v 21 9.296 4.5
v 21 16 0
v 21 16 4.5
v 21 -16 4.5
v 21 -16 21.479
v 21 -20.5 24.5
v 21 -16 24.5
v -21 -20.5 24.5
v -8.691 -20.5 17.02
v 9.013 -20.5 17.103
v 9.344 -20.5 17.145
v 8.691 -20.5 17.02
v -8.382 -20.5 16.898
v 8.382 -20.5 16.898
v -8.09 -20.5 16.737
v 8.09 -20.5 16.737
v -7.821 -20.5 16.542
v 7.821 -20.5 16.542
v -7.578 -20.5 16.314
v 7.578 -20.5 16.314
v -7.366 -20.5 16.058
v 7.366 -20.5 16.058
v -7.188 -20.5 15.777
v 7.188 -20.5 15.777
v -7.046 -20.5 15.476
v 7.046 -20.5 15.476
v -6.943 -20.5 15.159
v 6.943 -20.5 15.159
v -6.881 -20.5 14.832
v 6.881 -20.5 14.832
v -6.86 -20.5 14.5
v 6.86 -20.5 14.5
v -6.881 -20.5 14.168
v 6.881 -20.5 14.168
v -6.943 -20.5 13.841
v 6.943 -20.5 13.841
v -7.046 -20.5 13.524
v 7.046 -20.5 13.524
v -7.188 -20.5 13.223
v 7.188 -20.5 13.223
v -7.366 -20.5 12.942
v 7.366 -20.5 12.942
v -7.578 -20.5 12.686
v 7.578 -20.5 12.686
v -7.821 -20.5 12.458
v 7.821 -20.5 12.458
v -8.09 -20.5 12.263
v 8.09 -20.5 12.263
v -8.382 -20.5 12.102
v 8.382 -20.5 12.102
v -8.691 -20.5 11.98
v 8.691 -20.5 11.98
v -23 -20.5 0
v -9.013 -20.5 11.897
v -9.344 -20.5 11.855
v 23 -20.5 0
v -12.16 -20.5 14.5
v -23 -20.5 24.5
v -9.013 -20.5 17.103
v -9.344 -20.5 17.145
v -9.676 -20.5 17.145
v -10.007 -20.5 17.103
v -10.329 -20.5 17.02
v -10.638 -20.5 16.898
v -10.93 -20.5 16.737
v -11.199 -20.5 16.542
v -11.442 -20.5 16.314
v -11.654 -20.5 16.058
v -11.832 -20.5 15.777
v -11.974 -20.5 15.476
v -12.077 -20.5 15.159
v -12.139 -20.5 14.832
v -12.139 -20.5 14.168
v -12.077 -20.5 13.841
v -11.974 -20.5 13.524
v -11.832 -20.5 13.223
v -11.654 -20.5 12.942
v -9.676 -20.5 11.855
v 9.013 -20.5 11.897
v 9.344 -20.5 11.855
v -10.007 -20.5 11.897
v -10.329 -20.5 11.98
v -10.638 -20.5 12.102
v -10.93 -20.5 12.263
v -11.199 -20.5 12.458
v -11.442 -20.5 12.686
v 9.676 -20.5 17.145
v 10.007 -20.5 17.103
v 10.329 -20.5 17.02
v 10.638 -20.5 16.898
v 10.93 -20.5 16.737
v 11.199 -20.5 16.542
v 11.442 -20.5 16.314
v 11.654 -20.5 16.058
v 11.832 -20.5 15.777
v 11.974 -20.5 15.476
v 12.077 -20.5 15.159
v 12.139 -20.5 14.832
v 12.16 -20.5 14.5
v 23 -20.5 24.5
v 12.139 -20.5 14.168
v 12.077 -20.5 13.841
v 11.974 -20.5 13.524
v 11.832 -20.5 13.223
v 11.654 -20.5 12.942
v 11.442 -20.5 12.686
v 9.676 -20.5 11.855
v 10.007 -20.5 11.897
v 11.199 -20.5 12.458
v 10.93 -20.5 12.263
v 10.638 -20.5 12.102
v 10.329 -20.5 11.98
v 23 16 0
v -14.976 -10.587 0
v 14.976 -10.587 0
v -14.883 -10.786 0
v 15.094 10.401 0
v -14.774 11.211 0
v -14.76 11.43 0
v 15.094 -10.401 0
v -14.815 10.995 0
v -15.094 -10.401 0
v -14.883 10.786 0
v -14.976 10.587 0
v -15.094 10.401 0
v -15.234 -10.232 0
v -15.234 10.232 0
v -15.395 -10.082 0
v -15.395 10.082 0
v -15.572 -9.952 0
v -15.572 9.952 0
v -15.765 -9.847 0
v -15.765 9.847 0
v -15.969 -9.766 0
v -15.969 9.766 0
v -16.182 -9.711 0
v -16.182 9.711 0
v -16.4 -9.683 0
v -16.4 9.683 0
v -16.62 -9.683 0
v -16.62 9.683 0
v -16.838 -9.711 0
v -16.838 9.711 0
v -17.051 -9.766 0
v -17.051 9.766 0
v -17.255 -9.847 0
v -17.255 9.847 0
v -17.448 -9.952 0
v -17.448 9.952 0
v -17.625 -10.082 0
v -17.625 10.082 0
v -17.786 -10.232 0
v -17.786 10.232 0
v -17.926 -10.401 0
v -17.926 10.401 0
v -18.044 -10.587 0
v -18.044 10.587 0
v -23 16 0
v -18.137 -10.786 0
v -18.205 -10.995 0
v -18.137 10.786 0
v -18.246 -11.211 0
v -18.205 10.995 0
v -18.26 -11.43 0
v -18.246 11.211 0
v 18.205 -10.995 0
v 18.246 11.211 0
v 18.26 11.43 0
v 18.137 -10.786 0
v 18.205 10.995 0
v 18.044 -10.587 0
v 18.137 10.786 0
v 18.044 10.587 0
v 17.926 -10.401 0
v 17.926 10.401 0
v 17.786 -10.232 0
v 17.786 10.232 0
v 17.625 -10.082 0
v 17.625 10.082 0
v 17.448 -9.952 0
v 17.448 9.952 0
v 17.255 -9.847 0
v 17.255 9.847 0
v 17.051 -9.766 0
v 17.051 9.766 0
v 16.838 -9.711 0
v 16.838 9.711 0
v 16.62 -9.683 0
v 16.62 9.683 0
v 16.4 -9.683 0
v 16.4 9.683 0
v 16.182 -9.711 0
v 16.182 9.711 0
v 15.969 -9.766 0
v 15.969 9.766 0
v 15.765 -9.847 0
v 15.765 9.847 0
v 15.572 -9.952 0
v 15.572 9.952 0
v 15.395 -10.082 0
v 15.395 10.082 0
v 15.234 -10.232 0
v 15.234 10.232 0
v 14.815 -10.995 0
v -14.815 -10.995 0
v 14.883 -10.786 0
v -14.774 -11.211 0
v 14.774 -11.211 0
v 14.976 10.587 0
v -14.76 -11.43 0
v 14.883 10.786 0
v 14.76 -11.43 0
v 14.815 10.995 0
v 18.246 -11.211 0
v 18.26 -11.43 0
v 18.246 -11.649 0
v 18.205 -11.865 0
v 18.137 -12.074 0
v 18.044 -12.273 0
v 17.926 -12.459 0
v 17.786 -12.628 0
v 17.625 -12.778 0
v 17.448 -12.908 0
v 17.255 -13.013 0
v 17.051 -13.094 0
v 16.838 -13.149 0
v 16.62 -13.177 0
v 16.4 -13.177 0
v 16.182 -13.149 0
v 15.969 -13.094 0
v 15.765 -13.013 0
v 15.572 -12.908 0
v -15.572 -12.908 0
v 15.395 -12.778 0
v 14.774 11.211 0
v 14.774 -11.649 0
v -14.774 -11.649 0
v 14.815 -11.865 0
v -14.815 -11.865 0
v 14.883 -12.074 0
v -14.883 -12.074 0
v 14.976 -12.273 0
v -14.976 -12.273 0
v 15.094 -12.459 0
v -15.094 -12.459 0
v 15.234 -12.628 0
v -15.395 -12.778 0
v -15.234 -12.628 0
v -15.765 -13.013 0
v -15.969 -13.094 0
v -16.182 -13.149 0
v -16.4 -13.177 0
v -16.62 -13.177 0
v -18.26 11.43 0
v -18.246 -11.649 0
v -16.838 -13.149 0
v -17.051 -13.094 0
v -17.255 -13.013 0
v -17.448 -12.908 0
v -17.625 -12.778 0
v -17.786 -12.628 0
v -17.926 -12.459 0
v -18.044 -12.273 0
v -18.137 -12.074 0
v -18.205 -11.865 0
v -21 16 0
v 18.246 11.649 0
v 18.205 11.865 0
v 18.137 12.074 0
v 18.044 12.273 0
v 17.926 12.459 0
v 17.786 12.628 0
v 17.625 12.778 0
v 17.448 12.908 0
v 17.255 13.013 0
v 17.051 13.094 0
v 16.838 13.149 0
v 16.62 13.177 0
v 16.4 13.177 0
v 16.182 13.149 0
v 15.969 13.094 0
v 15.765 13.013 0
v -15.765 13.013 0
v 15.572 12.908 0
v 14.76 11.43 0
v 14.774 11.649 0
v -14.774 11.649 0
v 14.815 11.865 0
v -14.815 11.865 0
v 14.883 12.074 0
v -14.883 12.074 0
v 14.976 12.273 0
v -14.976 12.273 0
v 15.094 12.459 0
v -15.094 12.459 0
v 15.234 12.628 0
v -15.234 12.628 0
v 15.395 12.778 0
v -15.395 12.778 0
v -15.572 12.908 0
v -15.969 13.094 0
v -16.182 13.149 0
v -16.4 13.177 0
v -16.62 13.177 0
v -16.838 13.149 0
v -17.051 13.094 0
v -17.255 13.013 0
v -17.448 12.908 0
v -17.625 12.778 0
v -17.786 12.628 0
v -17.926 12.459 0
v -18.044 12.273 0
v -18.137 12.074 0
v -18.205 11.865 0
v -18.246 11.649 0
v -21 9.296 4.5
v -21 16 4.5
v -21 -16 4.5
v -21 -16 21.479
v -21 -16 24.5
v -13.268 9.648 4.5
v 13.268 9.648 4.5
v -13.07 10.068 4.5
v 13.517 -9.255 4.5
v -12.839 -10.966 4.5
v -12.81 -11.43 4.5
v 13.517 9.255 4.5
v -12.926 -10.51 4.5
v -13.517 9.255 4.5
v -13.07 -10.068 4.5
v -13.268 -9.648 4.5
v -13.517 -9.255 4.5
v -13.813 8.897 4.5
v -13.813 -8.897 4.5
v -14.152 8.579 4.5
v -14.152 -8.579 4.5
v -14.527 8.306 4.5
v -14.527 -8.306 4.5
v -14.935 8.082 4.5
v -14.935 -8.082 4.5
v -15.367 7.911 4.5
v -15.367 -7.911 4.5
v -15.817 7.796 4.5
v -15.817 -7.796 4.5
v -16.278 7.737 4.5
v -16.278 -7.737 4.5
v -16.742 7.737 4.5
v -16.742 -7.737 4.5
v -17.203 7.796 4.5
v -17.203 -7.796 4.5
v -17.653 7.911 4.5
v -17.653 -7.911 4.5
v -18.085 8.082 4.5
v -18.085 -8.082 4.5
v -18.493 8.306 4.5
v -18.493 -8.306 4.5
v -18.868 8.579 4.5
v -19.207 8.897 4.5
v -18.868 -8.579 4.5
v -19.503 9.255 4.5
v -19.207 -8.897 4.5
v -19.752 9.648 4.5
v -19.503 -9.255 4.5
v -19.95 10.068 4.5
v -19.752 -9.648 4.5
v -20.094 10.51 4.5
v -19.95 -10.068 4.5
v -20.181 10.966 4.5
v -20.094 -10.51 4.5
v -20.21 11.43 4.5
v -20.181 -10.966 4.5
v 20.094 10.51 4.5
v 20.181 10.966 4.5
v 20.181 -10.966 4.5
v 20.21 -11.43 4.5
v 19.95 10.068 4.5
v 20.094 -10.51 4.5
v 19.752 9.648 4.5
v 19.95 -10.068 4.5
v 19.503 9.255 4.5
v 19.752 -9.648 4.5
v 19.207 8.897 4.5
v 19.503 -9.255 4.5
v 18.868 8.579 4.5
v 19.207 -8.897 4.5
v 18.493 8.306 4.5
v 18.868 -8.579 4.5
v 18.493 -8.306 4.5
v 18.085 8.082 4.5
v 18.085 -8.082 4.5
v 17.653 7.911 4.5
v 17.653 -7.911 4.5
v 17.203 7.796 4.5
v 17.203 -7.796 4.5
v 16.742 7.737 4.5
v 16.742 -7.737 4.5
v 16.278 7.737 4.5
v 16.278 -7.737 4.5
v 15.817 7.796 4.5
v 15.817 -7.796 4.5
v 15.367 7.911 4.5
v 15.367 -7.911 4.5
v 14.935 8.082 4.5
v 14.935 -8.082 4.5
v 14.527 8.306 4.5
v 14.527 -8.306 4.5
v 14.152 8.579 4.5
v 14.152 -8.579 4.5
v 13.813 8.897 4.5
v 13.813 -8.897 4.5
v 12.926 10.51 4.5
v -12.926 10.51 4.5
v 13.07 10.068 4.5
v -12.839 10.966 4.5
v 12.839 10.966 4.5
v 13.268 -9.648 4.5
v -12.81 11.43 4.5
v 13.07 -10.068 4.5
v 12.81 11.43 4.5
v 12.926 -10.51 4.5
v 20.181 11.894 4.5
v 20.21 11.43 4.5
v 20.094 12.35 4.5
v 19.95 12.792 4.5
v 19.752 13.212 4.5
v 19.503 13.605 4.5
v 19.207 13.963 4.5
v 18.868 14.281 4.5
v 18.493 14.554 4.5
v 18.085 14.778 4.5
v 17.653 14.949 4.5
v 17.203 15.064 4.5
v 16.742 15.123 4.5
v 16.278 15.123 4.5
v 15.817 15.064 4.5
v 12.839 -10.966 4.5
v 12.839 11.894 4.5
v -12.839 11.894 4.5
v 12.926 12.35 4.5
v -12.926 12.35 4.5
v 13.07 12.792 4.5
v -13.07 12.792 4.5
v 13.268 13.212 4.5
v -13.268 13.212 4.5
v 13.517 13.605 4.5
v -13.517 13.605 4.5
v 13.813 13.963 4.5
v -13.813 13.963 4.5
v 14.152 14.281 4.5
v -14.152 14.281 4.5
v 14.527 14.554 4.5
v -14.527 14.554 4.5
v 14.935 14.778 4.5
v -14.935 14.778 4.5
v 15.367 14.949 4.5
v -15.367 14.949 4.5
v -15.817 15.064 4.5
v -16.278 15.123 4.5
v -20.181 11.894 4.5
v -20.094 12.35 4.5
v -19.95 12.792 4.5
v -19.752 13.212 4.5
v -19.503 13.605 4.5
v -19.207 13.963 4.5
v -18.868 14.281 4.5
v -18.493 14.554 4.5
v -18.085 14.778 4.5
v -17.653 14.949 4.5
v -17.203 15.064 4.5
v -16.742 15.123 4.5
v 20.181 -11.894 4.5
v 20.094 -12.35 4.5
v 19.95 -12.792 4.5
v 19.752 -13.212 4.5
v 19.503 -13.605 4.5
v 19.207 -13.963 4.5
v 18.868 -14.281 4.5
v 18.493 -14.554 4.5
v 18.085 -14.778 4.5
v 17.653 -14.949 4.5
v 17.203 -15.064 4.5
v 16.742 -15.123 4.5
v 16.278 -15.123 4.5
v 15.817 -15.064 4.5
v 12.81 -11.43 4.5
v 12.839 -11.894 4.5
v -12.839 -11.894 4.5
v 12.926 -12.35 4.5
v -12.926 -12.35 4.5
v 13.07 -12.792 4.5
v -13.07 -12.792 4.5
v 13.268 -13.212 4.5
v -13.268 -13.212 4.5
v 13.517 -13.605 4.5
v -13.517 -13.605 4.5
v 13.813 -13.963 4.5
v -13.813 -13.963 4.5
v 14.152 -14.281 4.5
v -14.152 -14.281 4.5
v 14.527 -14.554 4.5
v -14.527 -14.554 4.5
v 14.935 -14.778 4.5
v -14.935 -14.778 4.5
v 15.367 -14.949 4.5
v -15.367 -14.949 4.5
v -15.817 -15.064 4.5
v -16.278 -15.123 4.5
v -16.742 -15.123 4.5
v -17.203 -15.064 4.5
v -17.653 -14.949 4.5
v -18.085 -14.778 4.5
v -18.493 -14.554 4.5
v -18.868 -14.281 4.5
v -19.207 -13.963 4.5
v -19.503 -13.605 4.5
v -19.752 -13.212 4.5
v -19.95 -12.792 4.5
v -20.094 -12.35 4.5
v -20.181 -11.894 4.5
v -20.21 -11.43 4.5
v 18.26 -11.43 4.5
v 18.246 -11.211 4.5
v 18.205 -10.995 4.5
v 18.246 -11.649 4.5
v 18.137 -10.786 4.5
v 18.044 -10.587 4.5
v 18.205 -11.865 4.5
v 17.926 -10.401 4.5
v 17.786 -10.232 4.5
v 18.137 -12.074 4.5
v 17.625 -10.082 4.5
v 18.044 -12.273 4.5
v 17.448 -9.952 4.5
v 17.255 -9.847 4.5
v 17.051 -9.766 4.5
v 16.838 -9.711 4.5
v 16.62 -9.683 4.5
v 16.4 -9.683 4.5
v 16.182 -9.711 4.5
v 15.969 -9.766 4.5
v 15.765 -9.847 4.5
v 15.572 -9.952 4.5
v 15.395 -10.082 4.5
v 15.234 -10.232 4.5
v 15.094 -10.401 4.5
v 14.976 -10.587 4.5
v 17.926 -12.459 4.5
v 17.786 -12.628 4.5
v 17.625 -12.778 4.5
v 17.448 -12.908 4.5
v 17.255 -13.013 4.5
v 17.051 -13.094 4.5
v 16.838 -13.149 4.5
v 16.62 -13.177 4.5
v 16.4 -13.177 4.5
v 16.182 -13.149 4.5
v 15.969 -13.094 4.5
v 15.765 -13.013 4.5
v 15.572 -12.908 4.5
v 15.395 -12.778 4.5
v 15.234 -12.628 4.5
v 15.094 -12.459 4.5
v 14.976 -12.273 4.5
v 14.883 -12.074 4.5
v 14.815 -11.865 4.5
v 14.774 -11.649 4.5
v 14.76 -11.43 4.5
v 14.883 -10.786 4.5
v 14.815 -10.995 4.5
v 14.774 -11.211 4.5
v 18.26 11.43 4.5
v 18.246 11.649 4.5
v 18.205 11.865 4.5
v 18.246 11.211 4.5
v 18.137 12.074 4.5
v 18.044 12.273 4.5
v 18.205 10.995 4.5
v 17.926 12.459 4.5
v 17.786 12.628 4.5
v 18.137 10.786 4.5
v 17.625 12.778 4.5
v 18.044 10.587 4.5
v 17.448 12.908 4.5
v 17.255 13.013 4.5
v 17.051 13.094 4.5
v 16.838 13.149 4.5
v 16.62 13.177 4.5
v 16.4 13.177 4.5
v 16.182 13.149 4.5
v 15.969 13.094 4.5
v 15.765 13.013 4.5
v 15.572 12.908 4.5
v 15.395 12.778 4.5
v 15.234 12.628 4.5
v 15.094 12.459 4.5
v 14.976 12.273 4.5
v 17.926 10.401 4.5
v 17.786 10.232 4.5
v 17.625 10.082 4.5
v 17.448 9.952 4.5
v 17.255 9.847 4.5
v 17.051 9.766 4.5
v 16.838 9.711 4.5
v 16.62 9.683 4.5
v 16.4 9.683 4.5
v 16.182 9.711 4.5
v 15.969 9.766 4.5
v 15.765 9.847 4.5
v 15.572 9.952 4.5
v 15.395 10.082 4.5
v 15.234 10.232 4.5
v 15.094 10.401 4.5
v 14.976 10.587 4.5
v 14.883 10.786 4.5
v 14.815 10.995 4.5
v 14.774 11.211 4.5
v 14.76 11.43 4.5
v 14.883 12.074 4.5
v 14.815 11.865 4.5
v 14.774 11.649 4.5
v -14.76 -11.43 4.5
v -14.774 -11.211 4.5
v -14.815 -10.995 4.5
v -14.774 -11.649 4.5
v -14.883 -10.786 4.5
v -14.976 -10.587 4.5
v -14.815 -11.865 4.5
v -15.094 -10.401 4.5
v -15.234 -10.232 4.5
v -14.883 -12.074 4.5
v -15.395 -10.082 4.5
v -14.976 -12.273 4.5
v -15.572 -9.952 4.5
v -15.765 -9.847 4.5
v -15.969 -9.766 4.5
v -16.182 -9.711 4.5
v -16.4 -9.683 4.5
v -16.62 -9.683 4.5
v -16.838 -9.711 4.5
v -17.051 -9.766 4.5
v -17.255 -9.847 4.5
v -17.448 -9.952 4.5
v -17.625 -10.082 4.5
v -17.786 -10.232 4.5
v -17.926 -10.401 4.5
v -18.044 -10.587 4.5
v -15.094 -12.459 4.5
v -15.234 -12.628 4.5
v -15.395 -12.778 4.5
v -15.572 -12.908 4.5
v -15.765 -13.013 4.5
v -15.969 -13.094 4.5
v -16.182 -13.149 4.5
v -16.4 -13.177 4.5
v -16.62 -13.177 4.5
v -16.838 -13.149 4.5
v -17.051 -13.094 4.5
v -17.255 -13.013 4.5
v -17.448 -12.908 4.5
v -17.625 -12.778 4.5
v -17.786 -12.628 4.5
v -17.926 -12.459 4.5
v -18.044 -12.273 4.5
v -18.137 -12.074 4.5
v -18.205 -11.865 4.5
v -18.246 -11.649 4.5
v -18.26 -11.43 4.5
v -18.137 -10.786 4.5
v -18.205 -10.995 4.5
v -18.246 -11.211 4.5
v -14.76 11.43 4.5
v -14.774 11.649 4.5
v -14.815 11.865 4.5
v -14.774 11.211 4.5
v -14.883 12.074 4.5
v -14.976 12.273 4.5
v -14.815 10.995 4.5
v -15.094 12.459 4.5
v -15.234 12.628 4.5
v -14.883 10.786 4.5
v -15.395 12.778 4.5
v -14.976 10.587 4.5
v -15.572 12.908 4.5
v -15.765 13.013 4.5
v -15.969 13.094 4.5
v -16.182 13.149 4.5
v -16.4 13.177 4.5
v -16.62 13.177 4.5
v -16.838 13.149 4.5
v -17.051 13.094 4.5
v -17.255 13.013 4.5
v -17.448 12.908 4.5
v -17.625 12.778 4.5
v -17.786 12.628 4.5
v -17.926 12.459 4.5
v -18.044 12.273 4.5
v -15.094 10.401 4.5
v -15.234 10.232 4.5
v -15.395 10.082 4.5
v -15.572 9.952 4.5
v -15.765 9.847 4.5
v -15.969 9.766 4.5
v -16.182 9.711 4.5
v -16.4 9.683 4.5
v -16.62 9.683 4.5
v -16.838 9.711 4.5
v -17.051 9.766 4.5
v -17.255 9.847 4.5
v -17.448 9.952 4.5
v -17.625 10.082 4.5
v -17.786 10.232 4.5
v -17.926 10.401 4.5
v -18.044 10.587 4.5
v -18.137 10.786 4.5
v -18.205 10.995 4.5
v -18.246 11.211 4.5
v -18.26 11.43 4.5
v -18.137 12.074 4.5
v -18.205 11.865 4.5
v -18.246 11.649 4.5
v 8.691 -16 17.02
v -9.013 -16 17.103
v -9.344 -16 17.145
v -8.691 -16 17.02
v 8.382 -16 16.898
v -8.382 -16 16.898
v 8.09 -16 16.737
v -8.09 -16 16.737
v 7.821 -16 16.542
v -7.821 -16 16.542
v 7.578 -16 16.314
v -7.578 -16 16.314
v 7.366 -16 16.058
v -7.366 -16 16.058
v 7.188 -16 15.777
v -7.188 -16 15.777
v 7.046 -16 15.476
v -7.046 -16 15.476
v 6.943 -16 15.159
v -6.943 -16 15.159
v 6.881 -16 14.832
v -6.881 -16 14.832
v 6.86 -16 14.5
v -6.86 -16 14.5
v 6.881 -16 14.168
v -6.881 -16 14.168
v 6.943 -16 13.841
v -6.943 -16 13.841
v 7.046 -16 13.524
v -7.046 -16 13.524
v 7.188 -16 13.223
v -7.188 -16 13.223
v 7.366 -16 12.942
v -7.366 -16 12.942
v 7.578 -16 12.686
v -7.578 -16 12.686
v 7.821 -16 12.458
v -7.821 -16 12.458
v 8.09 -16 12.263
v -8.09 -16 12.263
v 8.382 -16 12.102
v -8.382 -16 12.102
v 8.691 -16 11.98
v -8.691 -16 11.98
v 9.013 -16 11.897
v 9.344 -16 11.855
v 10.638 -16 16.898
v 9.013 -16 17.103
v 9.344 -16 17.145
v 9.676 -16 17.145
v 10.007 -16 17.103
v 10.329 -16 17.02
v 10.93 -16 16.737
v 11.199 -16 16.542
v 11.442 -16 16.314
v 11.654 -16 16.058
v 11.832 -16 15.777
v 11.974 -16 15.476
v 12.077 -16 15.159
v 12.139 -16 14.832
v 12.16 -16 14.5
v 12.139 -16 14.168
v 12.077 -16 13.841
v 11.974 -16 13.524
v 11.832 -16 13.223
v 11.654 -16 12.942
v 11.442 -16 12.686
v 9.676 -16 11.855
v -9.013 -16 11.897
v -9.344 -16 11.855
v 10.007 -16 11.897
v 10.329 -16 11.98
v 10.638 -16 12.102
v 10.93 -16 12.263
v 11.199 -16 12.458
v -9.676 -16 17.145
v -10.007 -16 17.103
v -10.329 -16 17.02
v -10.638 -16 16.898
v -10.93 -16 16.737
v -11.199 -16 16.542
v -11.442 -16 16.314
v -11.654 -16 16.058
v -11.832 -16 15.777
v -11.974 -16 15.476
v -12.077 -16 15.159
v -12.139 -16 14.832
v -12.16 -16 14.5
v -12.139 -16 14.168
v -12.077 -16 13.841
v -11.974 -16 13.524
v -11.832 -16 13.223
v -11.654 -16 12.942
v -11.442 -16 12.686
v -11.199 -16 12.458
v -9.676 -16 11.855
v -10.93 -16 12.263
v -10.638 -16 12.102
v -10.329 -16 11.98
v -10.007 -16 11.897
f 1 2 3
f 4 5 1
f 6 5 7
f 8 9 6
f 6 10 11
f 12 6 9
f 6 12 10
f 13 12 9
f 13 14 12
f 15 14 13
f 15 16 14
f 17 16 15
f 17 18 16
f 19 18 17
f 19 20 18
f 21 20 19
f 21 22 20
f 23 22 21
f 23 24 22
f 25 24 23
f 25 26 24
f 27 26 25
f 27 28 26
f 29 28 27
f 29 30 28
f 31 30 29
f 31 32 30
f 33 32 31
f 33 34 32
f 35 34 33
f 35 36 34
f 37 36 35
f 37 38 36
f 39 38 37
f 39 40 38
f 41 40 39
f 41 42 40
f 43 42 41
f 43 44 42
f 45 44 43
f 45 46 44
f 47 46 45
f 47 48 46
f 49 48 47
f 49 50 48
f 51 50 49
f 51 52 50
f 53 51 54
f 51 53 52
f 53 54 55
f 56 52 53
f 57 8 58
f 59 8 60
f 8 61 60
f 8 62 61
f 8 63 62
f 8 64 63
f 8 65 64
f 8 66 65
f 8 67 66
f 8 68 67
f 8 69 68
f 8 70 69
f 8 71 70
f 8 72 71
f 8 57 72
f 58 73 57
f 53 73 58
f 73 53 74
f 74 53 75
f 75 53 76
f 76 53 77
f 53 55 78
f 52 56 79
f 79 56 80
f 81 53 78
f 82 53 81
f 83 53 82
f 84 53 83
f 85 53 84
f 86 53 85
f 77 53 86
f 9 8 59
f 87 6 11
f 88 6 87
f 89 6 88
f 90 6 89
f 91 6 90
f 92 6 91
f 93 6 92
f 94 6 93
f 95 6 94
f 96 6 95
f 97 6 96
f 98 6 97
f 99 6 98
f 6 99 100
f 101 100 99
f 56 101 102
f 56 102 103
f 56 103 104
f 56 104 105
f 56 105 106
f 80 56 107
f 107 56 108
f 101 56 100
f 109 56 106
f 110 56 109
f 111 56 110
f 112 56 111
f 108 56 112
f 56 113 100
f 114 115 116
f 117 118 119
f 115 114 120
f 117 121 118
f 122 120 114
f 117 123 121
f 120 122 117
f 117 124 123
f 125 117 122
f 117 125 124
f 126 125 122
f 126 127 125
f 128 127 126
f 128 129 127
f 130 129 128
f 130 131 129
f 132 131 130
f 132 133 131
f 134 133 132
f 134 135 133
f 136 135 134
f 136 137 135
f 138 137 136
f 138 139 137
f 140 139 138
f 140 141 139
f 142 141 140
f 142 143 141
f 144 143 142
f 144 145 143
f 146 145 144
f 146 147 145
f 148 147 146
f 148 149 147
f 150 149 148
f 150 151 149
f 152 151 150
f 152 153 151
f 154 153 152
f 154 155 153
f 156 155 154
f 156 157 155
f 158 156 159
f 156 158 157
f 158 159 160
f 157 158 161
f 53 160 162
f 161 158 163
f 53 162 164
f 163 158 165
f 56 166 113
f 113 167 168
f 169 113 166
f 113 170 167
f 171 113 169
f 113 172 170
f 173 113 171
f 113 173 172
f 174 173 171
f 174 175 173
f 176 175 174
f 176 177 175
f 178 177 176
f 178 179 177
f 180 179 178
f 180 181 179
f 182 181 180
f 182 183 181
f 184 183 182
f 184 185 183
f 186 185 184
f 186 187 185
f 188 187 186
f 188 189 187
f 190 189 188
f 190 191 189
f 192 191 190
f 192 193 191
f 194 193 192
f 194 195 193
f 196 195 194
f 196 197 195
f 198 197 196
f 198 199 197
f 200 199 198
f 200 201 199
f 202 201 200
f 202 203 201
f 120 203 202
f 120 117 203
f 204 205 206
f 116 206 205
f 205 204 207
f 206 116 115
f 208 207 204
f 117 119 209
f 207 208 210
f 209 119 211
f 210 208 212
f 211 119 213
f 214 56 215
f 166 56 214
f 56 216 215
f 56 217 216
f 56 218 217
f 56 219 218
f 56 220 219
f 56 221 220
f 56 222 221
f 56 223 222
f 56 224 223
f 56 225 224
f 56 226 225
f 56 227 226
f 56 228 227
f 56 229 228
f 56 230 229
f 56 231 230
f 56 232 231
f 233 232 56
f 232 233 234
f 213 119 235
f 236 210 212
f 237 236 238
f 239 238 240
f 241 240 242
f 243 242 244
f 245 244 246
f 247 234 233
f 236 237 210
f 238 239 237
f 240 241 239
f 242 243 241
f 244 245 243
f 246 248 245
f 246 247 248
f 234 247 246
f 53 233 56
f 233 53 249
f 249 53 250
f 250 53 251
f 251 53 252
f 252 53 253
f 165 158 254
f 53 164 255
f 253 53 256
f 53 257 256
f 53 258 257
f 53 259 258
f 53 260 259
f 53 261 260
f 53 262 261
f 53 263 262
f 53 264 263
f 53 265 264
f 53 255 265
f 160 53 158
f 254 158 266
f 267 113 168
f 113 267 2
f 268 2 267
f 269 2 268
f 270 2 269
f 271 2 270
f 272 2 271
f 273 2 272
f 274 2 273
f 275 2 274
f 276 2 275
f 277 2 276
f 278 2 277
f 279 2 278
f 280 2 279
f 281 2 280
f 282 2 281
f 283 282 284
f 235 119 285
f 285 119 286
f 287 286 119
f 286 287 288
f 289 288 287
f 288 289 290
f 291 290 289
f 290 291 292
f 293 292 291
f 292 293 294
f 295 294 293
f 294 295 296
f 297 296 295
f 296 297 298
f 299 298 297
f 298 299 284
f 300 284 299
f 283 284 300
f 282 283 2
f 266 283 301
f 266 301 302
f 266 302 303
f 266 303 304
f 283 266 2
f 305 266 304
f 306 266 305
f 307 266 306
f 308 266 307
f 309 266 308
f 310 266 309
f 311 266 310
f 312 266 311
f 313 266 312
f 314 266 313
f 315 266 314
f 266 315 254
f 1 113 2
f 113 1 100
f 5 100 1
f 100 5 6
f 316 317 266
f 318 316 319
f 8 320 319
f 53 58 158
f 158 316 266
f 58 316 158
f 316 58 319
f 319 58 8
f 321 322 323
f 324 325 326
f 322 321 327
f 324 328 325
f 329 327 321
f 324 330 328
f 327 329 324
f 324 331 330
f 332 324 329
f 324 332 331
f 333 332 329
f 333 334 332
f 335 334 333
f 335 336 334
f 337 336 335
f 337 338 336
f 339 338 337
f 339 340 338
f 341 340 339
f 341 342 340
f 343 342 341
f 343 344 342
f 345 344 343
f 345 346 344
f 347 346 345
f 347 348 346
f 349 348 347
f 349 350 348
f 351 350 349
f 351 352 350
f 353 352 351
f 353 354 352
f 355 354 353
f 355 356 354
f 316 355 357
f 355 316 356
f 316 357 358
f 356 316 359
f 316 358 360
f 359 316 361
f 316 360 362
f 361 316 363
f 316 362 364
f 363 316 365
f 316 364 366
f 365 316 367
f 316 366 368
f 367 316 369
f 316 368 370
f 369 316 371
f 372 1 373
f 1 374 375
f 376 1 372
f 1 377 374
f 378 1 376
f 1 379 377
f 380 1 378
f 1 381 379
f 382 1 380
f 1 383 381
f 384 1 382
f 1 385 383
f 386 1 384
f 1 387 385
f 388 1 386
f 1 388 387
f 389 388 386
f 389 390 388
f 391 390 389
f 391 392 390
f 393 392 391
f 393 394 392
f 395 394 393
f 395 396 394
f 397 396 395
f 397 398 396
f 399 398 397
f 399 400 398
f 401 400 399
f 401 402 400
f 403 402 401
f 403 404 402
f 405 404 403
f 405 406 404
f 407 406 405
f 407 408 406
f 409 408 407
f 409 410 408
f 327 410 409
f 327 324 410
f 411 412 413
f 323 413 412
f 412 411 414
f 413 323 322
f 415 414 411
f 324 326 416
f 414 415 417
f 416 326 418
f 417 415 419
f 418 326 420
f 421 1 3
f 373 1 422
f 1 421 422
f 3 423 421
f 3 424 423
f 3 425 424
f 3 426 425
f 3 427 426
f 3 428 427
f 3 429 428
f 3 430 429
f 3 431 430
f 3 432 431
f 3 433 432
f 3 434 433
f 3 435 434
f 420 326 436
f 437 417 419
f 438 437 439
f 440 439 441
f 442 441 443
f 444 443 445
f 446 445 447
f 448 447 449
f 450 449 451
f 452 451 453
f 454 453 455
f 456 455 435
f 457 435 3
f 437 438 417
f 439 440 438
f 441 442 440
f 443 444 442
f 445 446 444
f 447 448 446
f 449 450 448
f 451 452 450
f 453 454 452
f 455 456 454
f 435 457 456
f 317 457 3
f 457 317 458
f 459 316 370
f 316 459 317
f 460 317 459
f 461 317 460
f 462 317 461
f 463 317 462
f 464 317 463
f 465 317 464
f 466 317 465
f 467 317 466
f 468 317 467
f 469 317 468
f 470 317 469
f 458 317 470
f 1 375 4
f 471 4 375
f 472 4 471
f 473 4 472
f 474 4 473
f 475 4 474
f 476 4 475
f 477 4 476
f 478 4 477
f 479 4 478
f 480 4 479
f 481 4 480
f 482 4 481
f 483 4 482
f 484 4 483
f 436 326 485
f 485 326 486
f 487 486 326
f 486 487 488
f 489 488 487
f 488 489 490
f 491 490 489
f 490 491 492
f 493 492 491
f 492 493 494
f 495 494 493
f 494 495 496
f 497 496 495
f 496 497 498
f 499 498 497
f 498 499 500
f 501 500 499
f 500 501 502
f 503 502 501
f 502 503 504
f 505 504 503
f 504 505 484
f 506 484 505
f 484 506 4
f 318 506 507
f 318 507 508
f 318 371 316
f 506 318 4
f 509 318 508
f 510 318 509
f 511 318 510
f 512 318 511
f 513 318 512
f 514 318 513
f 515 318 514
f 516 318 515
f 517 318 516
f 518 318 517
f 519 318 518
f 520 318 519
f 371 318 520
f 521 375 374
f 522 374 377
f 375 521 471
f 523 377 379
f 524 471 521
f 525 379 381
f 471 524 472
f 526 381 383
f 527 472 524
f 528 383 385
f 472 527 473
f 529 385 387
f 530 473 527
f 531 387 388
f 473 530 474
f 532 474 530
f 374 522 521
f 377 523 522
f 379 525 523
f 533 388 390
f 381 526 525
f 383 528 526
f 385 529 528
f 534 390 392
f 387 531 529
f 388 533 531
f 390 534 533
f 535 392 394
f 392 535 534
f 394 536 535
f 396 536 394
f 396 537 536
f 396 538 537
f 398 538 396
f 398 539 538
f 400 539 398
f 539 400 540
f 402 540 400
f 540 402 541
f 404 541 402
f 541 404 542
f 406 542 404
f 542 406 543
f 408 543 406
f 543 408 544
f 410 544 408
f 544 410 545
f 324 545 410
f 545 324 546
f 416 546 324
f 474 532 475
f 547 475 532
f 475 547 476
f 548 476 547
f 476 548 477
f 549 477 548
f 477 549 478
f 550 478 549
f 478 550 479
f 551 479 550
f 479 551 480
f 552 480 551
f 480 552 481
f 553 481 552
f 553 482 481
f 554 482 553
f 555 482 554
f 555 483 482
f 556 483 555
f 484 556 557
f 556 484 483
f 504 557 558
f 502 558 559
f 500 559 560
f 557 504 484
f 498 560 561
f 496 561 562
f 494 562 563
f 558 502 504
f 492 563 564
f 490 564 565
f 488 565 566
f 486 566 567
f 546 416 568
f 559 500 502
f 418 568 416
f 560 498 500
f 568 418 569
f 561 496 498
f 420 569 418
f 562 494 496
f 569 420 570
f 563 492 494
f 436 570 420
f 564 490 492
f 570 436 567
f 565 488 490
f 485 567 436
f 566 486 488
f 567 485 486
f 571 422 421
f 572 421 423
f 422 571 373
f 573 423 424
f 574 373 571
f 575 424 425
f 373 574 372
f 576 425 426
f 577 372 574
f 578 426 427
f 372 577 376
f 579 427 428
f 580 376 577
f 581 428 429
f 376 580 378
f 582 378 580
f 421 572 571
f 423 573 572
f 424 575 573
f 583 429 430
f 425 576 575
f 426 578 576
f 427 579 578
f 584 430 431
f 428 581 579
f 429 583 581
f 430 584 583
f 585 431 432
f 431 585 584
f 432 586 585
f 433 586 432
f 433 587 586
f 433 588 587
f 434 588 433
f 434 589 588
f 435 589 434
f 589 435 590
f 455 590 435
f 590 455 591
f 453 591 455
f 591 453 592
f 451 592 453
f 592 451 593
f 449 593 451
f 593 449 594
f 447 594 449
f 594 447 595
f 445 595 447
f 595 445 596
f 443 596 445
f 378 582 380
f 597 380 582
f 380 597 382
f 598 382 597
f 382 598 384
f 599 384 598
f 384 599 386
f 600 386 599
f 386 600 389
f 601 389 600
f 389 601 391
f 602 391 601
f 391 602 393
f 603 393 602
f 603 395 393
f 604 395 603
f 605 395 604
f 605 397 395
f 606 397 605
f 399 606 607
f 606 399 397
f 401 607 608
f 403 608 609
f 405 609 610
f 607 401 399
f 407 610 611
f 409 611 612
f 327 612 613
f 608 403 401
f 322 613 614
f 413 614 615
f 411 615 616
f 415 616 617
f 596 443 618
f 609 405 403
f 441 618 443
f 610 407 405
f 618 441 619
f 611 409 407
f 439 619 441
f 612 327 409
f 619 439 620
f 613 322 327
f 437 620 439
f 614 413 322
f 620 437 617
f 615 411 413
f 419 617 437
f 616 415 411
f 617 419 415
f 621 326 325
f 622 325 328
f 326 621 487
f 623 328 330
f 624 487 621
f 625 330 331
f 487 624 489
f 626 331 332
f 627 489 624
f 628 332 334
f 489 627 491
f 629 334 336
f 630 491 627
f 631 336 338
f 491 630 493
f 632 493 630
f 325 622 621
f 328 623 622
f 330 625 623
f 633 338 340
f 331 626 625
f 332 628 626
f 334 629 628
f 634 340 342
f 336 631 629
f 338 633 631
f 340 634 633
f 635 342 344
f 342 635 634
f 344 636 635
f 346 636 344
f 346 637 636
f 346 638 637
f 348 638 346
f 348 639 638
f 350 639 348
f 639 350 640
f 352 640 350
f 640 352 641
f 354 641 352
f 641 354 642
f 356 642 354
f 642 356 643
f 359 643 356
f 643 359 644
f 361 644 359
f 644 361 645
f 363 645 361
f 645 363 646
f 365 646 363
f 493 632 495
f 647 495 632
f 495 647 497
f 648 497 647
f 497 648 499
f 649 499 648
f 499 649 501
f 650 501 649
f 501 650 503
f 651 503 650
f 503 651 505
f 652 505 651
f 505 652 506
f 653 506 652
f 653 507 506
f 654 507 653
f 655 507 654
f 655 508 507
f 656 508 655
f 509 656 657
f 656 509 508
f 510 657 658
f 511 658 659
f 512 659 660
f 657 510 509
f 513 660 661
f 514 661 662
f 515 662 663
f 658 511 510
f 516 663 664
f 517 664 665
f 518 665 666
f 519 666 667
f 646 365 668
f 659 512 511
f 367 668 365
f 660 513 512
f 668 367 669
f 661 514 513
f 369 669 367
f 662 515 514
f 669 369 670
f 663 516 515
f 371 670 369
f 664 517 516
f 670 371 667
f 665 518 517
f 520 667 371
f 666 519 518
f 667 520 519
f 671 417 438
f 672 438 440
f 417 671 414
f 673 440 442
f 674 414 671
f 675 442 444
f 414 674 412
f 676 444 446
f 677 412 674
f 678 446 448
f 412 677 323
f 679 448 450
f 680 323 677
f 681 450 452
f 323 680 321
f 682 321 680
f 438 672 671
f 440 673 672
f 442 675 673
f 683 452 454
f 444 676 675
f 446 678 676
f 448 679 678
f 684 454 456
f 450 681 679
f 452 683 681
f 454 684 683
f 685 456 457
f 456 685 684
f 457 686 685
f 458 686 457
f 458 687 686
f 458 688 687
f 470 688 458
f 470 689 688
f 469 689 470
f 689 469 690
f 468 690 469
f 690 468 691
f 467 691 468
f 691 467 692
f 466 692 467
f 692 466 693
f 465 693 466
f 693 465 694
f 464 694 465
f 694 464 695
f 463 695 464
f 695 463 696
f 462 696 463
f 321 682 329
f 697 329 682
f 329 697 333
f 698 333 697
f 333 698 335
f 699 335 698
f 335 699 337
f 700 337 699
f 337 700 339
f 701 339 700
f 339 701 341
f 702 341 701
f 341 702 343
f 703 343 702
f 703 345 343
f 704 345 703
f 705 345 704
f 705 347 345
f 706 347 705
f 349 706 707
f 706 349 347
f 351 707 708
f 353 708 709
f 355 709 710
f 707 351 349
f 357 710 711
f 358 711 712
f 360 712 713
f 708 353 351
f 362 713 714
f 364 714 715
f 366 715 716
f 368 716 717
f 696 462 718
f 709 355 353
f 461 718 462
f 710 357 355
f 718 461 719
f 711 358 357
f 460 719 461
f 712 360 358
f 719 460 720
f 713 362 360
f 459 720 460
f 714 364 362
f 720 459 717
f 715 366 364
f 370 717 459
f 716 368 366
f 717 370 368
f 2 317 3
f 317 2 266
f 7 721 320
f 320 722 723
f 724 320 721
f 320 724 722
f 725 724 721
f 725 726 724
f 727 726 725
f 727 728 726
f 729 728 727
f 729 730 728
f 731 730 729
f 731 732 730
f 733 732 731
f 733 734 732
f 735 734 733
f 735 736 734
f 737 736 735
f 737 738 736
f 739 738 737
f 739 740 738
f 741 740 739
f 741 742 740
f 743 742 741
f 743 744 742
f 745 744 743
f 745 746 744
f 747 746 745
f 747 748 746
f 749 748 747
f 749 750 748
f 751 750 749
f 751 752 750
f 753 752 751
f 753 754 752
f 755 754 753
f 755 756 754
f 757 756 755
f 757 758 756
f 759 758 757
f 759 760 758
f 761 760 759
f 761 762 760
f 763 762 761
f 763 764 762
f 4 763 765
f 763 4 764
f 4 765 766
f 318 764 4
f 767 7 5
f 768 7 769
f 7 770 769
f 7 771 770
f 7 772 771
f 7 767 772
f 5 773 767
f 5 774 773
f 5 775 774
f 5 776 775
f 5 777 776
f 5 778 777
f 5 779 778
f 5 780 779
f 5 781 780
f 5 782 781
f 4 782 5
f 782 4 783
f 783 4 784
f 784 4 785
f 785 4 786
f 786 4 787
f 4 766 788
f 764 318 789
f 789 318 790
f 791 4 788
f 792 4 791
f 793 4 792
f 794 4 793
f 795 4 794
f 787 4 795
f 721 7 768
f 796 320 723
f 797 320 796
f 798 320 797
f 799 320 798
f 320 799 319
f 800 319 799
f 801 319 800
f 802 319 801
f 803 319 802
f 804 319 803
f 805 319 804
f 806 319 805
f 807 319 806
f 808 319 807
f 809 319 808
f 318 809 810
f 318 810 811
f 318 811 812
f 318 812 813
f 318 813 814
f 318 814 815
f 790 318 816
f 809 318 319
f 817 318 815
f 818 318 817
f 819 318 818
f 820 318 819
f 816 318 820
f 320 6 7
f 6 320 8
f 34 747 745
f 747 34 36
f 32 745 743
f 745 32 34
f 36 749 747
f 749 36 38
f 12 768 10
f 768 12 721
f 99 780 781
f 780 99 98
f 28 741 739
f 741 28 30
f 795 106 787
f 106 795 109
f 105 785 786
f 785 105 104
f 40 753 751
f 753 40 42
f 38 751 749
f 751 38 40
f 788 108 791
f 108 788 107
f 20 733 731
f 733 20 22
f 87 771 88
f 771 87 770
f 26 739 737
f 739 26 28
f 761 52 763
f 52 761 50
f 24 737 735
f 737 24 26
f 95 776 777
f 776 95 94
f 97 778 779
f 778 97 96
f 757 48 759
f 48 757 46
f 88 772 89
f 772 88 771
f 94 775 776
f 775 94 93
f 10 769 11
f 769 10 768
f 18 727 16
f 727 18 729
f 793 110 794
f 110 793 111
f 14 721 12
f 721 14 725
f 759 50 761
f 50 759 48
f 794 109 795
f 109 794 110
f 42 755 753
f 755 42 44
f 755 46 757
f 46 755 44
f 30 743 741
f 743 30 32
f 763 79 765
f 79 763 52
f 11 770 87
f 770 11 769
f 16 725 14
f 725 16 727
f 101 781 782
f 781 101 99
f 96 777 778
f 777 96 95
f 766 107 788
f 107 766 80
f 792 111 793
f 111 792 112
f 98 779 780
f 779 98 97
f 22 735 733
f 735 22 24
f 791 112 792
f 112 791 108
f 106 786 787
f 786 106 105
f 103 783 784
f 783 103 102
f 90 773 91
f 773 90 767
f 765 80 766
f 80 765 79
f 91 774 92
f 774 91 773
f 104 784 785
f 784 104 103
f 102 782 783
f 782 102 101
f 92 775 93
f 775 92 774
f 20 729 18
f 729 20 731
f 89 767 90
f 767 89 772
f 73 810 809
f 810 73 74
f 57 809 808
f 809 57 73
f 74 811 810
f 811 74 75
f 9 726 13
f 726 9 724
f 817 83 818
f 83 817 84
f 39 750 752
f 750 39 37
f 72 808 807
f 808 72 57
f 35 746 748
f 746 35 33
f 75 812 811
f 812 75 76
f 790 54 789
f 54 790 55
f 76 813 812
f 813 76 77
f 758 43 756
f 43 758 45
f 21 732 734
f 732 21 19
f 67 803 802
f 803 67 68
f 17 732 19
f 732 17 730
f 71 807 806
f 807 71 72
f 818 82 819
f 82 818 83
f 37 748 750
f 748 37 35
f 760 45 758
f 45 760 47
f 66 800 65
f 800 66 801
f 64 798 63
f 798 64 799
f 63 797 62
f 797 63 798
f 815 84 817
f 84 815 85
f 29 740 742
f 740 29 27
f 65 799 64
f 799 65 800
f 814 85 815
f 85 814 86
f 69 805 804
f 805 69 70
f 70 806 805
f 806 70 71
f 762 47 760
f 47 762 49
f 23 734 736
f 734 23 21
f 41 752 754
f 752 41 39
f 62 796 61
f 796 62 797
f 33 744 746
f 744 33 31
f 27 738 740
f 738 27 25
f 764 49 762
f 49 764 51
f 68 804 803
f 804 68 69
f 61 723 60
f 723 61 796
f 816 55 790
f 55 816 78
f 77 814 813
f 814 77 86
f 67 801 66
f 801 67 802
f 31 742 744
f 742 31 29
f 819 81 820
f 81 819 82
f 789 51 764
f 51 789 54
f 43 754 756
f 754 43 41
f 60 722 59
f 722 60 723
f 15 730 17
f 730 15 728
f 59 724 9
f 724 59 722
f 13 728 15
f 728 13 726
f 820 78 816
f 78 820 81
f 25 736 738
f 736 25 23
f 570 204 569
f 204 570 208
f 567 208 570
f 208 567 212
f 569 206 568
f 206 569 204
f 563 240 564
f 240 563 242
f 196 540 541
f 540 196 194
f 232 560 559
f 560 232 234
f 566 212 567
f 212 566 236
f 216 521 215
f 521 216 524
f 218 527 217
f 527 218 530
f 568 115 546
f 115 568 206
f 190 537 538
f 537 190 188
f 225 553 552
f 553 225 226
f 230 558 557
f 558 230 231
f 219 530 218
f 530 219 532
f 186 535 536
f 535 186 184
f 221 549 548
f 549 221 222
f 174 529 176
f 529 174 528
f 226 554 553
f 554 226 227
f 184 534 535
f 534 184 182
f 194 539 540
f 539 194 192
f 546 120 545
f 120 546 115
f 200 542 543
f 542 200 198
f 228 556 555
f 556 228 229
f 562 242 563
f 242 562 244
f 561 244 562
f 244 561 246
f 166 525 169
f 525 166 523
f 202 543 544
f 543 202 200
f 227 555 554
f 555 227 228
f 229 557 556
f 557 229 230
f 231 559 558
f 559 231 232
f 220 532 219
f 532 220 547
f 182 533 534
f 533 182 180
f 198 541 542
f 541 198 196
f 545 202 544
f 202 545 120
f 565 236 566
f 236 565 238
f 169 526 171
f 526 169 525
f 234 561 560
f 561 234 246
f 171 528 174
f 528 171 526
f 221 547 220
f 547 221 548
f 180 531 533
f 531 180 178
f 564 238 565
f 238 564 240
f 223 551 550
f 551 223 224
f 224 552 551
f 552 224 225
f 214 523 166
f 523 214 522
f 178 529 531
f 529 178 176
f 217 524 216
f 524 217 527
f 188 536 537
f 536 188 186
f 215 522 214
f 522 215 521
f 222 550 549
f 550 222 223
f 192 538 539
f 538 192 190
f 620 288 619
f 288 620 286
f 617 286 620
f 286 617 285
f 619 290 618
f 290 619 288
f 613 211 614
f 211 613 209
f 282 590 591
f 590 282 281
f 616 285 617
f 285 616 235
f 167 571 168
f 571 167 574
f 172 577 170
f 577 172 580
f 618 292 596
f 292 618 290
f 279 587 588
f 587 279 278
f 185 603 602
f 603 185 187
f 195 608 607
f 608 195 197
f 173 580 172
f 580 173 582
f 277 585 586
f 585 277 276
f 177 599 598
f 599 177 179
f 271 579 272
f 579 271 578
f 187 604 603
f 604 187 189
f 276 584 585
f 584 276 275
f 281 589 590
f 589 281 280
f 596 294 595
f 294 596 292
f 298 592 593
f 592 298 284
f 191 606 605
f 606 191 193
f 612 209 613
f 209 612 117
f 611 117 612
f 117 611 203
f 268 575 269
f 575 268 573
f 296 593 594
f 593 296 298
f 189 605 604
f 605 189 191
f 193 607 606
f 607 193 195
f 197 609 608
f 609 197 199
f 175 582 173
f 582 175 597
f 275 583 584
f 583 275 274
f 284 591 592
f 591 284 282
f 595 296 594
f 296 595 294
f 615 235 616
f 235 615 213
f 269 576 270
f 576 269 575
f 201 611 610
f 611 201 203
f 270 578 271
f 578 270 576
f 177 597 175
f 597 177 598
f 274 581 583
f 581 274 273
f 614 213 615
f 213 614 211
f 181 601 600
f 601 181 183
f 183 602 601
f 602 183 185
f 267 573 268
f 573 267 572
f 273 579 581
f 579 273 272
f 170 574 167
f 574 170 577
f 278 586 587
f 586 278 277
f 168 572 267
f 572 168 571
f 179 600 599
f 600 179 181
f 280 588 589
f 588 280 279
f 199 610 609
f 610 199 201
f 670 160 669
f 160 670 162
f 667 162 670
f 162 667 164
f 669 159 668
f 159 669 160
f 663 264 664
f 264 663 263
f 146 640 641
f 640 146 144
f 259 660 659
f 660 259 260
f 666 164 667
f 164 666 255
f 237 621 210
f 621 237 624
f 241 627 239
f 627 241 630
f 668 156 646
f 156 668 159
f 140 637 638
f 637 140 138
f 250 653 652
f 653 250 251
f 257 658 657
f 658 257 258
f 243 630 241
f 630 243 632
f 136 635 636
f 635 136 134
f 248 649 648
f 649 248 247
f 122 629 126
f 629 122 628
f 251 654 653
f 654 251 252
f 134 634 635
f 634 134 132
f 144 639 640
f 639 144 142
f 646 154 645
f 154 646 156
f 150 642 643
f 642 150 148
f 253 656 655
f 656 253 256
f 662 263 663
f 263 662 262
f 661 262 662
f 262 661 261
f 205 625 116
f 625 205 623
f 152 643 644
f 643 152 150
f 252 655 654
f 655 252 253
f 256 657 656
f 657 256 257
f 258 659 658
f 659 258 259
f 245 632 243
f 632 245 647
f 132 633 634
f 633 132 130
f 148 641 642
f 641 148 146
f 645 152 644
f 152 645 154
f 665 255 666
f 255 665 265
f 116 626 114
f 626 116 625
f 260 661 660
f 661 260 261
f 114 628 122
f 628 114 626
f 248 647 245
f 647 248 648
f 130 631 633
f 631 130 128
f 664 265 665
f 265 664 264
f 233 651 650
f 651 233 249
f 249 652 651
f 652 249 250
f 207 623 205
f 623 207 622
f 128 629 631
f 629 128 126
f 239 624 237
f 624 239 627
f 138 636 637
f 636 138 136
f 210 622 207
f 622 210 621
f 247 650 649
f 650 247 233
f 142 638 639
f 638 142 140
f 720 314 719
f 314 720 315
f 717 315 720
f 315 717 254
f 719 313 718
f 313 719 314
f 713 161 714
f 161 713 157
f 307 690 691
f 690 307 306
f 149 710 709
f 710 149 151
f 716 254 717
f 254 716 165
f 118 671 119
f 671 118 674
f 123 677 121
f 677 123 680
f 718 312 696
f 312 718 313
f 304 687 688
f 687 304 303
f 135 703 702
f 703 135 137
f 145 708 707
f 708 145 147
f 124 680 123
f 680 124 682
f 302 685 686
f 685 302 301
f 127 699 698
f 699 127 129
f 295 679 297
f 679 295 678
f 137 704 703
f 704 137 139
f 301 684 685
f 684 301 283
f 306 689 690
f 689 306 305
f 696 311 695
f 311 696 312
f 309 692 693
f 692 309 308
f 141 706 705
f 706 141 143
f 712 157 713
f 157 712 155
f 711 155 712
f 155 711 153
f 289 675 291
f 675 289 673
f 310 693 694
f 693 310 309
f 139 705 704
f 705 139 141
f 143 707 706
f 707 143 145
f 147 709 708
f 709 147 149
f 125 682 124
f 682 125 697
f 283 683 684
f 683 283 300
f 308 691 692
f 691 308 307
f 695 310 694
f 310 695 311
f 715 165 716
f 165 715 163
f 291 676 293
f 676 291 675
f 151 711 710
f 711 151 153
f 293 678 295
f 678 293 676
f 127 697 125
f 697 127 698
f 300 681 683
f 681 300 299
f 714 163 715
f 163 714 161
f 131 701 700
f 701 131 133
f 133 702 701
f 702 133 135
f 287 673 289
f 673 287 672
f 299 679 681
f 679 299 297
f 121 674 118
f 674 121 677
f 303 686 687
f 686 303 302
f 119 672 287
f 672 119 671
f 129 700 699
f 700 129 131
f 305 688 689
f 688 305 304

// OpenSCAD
use <../helpers.scad>

radial_clearance = 0.2;
diametric_clearance = radial_clearance*2;

plate = 4.5;
sideplate = 4.5;

psu_length = 42;
psu_width = 32;

screwsep_short = 22.86;
screwsep_long = 33.02;

//sidescrewsep_short = screwsep_short-18;
sidescrewsep_long = screwsep_long-14;

extrusion_size = 20;

mirror([1,0,0])
difference()
{
    union()
    {
        translate([0,0,plate/2])
        cube([psu_length,psu_width,plate],center=true);
        
        //translate([-psu_length/2,-psu_width/2,plate])
        //cube([sideplate,psu_width,extrusion_size]);
        
        translate([-psu_length/2,-psu_width/2-sideplate,0])
        cube([psu_length,sideplate,extrusion_size+plate]);
        
        for(ii=[0,1])
        mirror([ii,0,0])
        translate([-1-psu_length/2,-sideplate/2,0])
        rotate([0,0,-90])
        ramp(psu_width+sideplate,2,0,extrusion_size+plate);
    }
    
    //Side screws
    //for (ii=[-1,1])
    //translate([-1-psu_length/2,ii*sidescrewsep_short/2,plate+extrusion_size/2])
    //rotate([0,90,0])
    //cylinder(d=5.3,h=sideplate+2,$fn=50);
    
    for (ii=[-1,1])
    translate([ii*sidescrewsep_long/2,-1-psu_width/2-sideplate,plate+extrusion_size/2])
    rotate([-90,0,0])
    cylinder(d=5.3,h=2*sideplate+2,$fn=50);
    
    
    //PSU screws
    for (xx=[-1,1])
    for (yy=[-1,1])
    translate([xx*screwsep_long/2,yy*screwsep_short/2,0])
    {
        translate([0,0,-1])
        cylinder(d=3.1+diametric_clearance,h=plate+extrusion_size+2,$fn=50);
        
        translate([0,0,plate])
        cylinder(d=7.0+diametric_clearance,h=plate+extrusion_size+2,$fn=50);
    }
    
    /*
    //Bottom reliefs
    tri_start_x = screwsep_long/2-5;
    tri_start_y = screwsep_short/2-5-5;
    translate([0,0,-1])
    linear_extrude(h=plate+extrusion_size+2)
    polygon(points=[[-tri_start_x,-tri_start_y],[-5,0],[-tri_start_x,tri_start_y]],convexity=1);
    
    mirror([1,0,0])
    translate([0,0,-1])
    linear_extrude(h=plate+extrusion_size+2)
    polygon(points=[[-tri_start_x,-tri_start_y],[-5,0],[-tri_start_x,tri_start_y]],convexity=1);
    
    translate([0,0,-1])
    linear_extrude(h=plate+extrusion_size+2)
    polygon(points=[[-tri_start_x+5,-tri_start_y-5],[0,-5],[tri_start_x-5,-tri_start_y-5]],convexity=1);
    
    mirror([0,1,0])
    translate([0,0,-1])
    linear_extrude(h=plate+extrusion_size+2)
    polygon(points=[[-tri_start_x+5,-tri_start_y-5],[0,-5],[tri_start_x-5,-tri_start_y-5]],convexity=1);
    */
}
